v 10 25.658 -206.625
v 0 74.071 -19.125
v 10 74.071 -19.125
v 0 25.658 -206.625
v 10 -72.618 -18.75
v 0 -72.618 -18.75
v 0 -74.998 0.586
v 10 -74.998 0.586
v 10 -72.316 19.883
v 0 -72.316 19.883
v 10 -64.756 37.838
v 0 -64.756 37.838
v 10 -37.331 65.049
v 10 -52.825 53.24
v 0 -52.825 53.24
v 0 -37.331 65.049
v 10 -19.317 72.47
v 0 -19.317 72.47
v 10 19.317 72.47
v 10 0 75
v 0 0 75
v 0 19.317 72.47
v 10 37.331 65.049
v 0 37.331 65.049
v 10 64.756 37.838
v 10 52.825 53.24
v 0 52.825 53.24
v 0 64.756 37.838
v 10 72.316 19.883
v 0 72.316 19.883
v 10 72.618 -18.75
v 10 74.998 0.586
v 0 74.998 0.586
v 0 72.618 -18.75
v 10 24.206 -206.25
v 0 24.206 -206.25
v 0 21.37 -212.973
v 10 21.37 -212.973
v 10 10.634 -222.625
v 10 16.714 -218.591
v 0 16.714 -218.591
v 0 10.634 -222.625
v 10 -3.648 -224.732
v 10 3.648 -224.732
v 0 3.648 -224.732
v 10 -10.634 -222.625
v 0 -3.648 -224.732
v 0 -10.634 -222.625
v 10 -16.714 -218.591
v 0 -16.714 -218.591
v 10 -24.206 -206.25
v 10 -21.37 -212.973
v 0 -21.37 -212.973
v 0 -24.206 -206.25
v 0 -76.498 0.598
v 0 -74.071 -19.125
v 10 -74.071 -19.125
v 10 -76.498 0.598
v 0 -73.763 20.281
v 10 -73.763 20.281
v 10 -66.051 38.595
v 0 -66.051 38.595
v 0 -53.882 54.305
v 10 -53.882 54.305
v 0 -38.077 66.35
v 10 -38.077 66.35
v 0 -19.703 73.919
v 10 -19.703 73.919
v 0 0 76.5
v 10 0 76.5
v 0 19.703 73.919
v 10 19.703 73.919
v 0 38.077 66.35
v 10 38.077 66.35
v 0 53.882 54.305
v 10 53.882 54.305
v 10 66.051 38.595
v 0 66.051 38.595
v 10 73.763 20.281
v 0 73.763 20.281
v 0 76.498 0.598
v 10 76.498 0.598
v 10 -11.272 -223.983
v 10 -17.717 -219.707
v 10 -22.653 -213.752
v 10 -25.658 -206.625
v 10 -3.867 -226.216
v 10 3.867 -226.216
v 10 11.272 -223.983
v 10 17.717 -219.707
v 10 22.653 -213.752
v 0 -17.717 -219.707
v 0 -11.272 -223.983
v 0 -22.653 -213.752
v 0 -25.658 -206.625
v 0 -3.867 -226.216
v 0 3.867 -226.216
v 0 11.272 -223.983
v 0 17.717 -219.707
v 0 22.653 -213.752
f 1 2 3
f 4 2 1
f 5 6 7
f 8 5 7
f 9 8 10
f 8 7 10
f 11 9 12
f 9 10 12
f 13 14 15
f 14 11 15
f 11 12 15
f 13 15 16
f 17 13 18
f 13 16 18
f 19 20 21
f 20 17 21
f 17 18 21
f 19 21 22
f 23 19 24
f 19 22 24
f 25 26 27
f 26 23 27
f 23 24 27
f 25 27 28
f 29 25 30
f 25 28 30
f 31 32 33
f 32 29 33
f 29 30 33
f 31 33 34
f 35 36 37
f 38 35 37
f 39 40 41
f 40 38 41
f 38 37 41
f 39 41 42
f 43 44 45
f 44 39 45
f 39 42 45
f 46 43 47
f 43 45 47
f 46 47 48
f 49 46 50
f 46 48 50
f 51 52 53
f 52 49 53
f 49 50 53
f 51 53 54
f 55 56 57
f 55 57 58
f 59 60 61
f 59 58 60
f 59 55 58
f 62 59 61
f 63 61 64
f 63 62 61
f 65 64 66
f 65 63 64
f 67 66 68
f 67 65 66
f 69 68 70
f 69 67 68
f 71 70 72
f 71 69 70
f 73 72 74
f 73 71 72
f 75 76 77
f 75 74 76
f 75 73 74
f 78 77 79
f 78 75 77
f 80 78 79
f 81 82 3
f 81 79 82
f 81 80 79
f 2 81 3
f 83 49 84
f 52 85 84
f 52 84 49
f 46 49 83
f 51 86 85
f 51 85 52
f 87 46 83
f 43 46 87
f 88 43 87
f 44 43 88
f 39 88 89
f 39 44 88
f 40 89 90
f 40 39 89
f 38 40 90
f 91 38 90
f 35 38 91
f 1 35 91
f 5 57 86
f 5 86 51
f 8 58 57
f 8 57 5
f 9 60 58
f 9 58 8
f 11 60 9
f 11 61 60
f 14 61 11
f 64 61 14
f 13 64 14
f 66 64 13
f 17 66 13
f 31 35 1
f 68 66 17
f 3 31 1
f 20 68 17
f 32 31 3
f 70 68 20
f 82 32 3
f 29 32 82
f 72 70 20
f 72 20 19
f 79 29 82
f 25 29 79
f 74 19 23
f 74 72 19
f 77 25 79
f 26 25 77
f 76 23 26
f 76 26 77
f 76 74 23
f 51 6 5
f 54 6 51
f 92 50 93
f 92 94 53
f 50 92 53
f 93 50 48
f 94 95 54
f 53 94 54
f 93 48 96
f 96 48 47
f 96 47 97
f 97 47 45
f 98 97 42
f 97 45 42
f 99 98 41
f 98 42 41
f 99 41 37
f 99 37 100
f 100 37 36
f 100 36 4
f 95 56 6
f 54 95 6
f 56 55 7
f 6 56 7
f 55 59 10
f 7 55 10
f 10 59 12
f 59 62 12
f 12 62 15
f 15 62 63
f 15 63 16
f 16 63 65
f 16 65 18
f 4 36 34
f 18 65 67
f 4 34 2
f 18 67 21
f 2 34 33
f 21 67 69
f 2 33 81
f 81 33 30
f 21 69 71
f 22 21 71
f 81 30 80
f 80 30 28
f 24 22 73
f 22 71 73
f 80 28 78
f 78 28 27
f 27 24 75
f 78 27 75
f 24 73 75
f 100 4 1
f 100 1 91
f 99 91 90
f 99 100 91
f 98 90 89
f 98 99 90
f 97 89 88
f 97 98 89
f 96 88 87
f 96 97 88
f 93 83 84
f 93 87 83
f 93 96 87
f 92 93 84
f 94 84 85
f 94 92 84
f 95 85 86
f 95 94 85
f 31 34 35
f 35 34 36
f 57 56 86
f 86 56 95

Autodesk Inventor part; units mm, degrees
ref_plane "YZ Plane" through (0, 0, 0) normal (1, 0, 0) x (0, 1, 0)
ref_plane "XZ Plane" through (0, 0, 0) normal (0, 1, 0) x (-1, 0, 0)
ref_plane "XY Plane" through (0, 0, 0) normal (0, 0, 1) x (1, 0, 0)
sketch "スケッチ1" plane through (0, 0, 0) normal (1, 0, 0) x (0, 1, 0)
  arc A0 (74.0708, -19.125) -> (-74.0708, -19.125) centre (0, 0) ccw
  arc A1 (-25.6585, -206.625) -> (25.6585, -206.625) centre (0, -200) ccw
  line L0 (74.0708, -19.125) -> (25.6585, -206.625)
  line L1 (-74.0708, -19.125) -> (-25.6585, -206.625)
  arc A2 (72.6184, -18.75) -> (-72.6184, -18.75) centre (0, 0) ccw
  arc A3 (-24.2061, -206.25) -> (24.2061, -206.25) centre (0, -200) ccw
  line L2 (-72.6184, -18.75) -> (-24.2061, -206.25)
  line L3 (72.6184, -18.75) -> (24.2061, -206.25)
  point P0 (26.5, -200)
  point P1 (-26.5, -200)
  point P2 (-26.5, -200)
  point P3 (25, -200)
  point P4 (-25, -200)
  point P5 (-62.2511, -58.9026)
  point P6 (-30.0666, -183.5524)
  dimension "d0" = 153
  dimension "d1" = 53
  dimension "d2" = 200
  dimension "d3" = 200
  dimension "d4" = 150
  dimension "d5" = 50
  dimension "d6" = 200
extrude "押し出し1" add sketch "スケッチ1" along normal blind 10
properties part number "射出_type1" material "ゴム"
